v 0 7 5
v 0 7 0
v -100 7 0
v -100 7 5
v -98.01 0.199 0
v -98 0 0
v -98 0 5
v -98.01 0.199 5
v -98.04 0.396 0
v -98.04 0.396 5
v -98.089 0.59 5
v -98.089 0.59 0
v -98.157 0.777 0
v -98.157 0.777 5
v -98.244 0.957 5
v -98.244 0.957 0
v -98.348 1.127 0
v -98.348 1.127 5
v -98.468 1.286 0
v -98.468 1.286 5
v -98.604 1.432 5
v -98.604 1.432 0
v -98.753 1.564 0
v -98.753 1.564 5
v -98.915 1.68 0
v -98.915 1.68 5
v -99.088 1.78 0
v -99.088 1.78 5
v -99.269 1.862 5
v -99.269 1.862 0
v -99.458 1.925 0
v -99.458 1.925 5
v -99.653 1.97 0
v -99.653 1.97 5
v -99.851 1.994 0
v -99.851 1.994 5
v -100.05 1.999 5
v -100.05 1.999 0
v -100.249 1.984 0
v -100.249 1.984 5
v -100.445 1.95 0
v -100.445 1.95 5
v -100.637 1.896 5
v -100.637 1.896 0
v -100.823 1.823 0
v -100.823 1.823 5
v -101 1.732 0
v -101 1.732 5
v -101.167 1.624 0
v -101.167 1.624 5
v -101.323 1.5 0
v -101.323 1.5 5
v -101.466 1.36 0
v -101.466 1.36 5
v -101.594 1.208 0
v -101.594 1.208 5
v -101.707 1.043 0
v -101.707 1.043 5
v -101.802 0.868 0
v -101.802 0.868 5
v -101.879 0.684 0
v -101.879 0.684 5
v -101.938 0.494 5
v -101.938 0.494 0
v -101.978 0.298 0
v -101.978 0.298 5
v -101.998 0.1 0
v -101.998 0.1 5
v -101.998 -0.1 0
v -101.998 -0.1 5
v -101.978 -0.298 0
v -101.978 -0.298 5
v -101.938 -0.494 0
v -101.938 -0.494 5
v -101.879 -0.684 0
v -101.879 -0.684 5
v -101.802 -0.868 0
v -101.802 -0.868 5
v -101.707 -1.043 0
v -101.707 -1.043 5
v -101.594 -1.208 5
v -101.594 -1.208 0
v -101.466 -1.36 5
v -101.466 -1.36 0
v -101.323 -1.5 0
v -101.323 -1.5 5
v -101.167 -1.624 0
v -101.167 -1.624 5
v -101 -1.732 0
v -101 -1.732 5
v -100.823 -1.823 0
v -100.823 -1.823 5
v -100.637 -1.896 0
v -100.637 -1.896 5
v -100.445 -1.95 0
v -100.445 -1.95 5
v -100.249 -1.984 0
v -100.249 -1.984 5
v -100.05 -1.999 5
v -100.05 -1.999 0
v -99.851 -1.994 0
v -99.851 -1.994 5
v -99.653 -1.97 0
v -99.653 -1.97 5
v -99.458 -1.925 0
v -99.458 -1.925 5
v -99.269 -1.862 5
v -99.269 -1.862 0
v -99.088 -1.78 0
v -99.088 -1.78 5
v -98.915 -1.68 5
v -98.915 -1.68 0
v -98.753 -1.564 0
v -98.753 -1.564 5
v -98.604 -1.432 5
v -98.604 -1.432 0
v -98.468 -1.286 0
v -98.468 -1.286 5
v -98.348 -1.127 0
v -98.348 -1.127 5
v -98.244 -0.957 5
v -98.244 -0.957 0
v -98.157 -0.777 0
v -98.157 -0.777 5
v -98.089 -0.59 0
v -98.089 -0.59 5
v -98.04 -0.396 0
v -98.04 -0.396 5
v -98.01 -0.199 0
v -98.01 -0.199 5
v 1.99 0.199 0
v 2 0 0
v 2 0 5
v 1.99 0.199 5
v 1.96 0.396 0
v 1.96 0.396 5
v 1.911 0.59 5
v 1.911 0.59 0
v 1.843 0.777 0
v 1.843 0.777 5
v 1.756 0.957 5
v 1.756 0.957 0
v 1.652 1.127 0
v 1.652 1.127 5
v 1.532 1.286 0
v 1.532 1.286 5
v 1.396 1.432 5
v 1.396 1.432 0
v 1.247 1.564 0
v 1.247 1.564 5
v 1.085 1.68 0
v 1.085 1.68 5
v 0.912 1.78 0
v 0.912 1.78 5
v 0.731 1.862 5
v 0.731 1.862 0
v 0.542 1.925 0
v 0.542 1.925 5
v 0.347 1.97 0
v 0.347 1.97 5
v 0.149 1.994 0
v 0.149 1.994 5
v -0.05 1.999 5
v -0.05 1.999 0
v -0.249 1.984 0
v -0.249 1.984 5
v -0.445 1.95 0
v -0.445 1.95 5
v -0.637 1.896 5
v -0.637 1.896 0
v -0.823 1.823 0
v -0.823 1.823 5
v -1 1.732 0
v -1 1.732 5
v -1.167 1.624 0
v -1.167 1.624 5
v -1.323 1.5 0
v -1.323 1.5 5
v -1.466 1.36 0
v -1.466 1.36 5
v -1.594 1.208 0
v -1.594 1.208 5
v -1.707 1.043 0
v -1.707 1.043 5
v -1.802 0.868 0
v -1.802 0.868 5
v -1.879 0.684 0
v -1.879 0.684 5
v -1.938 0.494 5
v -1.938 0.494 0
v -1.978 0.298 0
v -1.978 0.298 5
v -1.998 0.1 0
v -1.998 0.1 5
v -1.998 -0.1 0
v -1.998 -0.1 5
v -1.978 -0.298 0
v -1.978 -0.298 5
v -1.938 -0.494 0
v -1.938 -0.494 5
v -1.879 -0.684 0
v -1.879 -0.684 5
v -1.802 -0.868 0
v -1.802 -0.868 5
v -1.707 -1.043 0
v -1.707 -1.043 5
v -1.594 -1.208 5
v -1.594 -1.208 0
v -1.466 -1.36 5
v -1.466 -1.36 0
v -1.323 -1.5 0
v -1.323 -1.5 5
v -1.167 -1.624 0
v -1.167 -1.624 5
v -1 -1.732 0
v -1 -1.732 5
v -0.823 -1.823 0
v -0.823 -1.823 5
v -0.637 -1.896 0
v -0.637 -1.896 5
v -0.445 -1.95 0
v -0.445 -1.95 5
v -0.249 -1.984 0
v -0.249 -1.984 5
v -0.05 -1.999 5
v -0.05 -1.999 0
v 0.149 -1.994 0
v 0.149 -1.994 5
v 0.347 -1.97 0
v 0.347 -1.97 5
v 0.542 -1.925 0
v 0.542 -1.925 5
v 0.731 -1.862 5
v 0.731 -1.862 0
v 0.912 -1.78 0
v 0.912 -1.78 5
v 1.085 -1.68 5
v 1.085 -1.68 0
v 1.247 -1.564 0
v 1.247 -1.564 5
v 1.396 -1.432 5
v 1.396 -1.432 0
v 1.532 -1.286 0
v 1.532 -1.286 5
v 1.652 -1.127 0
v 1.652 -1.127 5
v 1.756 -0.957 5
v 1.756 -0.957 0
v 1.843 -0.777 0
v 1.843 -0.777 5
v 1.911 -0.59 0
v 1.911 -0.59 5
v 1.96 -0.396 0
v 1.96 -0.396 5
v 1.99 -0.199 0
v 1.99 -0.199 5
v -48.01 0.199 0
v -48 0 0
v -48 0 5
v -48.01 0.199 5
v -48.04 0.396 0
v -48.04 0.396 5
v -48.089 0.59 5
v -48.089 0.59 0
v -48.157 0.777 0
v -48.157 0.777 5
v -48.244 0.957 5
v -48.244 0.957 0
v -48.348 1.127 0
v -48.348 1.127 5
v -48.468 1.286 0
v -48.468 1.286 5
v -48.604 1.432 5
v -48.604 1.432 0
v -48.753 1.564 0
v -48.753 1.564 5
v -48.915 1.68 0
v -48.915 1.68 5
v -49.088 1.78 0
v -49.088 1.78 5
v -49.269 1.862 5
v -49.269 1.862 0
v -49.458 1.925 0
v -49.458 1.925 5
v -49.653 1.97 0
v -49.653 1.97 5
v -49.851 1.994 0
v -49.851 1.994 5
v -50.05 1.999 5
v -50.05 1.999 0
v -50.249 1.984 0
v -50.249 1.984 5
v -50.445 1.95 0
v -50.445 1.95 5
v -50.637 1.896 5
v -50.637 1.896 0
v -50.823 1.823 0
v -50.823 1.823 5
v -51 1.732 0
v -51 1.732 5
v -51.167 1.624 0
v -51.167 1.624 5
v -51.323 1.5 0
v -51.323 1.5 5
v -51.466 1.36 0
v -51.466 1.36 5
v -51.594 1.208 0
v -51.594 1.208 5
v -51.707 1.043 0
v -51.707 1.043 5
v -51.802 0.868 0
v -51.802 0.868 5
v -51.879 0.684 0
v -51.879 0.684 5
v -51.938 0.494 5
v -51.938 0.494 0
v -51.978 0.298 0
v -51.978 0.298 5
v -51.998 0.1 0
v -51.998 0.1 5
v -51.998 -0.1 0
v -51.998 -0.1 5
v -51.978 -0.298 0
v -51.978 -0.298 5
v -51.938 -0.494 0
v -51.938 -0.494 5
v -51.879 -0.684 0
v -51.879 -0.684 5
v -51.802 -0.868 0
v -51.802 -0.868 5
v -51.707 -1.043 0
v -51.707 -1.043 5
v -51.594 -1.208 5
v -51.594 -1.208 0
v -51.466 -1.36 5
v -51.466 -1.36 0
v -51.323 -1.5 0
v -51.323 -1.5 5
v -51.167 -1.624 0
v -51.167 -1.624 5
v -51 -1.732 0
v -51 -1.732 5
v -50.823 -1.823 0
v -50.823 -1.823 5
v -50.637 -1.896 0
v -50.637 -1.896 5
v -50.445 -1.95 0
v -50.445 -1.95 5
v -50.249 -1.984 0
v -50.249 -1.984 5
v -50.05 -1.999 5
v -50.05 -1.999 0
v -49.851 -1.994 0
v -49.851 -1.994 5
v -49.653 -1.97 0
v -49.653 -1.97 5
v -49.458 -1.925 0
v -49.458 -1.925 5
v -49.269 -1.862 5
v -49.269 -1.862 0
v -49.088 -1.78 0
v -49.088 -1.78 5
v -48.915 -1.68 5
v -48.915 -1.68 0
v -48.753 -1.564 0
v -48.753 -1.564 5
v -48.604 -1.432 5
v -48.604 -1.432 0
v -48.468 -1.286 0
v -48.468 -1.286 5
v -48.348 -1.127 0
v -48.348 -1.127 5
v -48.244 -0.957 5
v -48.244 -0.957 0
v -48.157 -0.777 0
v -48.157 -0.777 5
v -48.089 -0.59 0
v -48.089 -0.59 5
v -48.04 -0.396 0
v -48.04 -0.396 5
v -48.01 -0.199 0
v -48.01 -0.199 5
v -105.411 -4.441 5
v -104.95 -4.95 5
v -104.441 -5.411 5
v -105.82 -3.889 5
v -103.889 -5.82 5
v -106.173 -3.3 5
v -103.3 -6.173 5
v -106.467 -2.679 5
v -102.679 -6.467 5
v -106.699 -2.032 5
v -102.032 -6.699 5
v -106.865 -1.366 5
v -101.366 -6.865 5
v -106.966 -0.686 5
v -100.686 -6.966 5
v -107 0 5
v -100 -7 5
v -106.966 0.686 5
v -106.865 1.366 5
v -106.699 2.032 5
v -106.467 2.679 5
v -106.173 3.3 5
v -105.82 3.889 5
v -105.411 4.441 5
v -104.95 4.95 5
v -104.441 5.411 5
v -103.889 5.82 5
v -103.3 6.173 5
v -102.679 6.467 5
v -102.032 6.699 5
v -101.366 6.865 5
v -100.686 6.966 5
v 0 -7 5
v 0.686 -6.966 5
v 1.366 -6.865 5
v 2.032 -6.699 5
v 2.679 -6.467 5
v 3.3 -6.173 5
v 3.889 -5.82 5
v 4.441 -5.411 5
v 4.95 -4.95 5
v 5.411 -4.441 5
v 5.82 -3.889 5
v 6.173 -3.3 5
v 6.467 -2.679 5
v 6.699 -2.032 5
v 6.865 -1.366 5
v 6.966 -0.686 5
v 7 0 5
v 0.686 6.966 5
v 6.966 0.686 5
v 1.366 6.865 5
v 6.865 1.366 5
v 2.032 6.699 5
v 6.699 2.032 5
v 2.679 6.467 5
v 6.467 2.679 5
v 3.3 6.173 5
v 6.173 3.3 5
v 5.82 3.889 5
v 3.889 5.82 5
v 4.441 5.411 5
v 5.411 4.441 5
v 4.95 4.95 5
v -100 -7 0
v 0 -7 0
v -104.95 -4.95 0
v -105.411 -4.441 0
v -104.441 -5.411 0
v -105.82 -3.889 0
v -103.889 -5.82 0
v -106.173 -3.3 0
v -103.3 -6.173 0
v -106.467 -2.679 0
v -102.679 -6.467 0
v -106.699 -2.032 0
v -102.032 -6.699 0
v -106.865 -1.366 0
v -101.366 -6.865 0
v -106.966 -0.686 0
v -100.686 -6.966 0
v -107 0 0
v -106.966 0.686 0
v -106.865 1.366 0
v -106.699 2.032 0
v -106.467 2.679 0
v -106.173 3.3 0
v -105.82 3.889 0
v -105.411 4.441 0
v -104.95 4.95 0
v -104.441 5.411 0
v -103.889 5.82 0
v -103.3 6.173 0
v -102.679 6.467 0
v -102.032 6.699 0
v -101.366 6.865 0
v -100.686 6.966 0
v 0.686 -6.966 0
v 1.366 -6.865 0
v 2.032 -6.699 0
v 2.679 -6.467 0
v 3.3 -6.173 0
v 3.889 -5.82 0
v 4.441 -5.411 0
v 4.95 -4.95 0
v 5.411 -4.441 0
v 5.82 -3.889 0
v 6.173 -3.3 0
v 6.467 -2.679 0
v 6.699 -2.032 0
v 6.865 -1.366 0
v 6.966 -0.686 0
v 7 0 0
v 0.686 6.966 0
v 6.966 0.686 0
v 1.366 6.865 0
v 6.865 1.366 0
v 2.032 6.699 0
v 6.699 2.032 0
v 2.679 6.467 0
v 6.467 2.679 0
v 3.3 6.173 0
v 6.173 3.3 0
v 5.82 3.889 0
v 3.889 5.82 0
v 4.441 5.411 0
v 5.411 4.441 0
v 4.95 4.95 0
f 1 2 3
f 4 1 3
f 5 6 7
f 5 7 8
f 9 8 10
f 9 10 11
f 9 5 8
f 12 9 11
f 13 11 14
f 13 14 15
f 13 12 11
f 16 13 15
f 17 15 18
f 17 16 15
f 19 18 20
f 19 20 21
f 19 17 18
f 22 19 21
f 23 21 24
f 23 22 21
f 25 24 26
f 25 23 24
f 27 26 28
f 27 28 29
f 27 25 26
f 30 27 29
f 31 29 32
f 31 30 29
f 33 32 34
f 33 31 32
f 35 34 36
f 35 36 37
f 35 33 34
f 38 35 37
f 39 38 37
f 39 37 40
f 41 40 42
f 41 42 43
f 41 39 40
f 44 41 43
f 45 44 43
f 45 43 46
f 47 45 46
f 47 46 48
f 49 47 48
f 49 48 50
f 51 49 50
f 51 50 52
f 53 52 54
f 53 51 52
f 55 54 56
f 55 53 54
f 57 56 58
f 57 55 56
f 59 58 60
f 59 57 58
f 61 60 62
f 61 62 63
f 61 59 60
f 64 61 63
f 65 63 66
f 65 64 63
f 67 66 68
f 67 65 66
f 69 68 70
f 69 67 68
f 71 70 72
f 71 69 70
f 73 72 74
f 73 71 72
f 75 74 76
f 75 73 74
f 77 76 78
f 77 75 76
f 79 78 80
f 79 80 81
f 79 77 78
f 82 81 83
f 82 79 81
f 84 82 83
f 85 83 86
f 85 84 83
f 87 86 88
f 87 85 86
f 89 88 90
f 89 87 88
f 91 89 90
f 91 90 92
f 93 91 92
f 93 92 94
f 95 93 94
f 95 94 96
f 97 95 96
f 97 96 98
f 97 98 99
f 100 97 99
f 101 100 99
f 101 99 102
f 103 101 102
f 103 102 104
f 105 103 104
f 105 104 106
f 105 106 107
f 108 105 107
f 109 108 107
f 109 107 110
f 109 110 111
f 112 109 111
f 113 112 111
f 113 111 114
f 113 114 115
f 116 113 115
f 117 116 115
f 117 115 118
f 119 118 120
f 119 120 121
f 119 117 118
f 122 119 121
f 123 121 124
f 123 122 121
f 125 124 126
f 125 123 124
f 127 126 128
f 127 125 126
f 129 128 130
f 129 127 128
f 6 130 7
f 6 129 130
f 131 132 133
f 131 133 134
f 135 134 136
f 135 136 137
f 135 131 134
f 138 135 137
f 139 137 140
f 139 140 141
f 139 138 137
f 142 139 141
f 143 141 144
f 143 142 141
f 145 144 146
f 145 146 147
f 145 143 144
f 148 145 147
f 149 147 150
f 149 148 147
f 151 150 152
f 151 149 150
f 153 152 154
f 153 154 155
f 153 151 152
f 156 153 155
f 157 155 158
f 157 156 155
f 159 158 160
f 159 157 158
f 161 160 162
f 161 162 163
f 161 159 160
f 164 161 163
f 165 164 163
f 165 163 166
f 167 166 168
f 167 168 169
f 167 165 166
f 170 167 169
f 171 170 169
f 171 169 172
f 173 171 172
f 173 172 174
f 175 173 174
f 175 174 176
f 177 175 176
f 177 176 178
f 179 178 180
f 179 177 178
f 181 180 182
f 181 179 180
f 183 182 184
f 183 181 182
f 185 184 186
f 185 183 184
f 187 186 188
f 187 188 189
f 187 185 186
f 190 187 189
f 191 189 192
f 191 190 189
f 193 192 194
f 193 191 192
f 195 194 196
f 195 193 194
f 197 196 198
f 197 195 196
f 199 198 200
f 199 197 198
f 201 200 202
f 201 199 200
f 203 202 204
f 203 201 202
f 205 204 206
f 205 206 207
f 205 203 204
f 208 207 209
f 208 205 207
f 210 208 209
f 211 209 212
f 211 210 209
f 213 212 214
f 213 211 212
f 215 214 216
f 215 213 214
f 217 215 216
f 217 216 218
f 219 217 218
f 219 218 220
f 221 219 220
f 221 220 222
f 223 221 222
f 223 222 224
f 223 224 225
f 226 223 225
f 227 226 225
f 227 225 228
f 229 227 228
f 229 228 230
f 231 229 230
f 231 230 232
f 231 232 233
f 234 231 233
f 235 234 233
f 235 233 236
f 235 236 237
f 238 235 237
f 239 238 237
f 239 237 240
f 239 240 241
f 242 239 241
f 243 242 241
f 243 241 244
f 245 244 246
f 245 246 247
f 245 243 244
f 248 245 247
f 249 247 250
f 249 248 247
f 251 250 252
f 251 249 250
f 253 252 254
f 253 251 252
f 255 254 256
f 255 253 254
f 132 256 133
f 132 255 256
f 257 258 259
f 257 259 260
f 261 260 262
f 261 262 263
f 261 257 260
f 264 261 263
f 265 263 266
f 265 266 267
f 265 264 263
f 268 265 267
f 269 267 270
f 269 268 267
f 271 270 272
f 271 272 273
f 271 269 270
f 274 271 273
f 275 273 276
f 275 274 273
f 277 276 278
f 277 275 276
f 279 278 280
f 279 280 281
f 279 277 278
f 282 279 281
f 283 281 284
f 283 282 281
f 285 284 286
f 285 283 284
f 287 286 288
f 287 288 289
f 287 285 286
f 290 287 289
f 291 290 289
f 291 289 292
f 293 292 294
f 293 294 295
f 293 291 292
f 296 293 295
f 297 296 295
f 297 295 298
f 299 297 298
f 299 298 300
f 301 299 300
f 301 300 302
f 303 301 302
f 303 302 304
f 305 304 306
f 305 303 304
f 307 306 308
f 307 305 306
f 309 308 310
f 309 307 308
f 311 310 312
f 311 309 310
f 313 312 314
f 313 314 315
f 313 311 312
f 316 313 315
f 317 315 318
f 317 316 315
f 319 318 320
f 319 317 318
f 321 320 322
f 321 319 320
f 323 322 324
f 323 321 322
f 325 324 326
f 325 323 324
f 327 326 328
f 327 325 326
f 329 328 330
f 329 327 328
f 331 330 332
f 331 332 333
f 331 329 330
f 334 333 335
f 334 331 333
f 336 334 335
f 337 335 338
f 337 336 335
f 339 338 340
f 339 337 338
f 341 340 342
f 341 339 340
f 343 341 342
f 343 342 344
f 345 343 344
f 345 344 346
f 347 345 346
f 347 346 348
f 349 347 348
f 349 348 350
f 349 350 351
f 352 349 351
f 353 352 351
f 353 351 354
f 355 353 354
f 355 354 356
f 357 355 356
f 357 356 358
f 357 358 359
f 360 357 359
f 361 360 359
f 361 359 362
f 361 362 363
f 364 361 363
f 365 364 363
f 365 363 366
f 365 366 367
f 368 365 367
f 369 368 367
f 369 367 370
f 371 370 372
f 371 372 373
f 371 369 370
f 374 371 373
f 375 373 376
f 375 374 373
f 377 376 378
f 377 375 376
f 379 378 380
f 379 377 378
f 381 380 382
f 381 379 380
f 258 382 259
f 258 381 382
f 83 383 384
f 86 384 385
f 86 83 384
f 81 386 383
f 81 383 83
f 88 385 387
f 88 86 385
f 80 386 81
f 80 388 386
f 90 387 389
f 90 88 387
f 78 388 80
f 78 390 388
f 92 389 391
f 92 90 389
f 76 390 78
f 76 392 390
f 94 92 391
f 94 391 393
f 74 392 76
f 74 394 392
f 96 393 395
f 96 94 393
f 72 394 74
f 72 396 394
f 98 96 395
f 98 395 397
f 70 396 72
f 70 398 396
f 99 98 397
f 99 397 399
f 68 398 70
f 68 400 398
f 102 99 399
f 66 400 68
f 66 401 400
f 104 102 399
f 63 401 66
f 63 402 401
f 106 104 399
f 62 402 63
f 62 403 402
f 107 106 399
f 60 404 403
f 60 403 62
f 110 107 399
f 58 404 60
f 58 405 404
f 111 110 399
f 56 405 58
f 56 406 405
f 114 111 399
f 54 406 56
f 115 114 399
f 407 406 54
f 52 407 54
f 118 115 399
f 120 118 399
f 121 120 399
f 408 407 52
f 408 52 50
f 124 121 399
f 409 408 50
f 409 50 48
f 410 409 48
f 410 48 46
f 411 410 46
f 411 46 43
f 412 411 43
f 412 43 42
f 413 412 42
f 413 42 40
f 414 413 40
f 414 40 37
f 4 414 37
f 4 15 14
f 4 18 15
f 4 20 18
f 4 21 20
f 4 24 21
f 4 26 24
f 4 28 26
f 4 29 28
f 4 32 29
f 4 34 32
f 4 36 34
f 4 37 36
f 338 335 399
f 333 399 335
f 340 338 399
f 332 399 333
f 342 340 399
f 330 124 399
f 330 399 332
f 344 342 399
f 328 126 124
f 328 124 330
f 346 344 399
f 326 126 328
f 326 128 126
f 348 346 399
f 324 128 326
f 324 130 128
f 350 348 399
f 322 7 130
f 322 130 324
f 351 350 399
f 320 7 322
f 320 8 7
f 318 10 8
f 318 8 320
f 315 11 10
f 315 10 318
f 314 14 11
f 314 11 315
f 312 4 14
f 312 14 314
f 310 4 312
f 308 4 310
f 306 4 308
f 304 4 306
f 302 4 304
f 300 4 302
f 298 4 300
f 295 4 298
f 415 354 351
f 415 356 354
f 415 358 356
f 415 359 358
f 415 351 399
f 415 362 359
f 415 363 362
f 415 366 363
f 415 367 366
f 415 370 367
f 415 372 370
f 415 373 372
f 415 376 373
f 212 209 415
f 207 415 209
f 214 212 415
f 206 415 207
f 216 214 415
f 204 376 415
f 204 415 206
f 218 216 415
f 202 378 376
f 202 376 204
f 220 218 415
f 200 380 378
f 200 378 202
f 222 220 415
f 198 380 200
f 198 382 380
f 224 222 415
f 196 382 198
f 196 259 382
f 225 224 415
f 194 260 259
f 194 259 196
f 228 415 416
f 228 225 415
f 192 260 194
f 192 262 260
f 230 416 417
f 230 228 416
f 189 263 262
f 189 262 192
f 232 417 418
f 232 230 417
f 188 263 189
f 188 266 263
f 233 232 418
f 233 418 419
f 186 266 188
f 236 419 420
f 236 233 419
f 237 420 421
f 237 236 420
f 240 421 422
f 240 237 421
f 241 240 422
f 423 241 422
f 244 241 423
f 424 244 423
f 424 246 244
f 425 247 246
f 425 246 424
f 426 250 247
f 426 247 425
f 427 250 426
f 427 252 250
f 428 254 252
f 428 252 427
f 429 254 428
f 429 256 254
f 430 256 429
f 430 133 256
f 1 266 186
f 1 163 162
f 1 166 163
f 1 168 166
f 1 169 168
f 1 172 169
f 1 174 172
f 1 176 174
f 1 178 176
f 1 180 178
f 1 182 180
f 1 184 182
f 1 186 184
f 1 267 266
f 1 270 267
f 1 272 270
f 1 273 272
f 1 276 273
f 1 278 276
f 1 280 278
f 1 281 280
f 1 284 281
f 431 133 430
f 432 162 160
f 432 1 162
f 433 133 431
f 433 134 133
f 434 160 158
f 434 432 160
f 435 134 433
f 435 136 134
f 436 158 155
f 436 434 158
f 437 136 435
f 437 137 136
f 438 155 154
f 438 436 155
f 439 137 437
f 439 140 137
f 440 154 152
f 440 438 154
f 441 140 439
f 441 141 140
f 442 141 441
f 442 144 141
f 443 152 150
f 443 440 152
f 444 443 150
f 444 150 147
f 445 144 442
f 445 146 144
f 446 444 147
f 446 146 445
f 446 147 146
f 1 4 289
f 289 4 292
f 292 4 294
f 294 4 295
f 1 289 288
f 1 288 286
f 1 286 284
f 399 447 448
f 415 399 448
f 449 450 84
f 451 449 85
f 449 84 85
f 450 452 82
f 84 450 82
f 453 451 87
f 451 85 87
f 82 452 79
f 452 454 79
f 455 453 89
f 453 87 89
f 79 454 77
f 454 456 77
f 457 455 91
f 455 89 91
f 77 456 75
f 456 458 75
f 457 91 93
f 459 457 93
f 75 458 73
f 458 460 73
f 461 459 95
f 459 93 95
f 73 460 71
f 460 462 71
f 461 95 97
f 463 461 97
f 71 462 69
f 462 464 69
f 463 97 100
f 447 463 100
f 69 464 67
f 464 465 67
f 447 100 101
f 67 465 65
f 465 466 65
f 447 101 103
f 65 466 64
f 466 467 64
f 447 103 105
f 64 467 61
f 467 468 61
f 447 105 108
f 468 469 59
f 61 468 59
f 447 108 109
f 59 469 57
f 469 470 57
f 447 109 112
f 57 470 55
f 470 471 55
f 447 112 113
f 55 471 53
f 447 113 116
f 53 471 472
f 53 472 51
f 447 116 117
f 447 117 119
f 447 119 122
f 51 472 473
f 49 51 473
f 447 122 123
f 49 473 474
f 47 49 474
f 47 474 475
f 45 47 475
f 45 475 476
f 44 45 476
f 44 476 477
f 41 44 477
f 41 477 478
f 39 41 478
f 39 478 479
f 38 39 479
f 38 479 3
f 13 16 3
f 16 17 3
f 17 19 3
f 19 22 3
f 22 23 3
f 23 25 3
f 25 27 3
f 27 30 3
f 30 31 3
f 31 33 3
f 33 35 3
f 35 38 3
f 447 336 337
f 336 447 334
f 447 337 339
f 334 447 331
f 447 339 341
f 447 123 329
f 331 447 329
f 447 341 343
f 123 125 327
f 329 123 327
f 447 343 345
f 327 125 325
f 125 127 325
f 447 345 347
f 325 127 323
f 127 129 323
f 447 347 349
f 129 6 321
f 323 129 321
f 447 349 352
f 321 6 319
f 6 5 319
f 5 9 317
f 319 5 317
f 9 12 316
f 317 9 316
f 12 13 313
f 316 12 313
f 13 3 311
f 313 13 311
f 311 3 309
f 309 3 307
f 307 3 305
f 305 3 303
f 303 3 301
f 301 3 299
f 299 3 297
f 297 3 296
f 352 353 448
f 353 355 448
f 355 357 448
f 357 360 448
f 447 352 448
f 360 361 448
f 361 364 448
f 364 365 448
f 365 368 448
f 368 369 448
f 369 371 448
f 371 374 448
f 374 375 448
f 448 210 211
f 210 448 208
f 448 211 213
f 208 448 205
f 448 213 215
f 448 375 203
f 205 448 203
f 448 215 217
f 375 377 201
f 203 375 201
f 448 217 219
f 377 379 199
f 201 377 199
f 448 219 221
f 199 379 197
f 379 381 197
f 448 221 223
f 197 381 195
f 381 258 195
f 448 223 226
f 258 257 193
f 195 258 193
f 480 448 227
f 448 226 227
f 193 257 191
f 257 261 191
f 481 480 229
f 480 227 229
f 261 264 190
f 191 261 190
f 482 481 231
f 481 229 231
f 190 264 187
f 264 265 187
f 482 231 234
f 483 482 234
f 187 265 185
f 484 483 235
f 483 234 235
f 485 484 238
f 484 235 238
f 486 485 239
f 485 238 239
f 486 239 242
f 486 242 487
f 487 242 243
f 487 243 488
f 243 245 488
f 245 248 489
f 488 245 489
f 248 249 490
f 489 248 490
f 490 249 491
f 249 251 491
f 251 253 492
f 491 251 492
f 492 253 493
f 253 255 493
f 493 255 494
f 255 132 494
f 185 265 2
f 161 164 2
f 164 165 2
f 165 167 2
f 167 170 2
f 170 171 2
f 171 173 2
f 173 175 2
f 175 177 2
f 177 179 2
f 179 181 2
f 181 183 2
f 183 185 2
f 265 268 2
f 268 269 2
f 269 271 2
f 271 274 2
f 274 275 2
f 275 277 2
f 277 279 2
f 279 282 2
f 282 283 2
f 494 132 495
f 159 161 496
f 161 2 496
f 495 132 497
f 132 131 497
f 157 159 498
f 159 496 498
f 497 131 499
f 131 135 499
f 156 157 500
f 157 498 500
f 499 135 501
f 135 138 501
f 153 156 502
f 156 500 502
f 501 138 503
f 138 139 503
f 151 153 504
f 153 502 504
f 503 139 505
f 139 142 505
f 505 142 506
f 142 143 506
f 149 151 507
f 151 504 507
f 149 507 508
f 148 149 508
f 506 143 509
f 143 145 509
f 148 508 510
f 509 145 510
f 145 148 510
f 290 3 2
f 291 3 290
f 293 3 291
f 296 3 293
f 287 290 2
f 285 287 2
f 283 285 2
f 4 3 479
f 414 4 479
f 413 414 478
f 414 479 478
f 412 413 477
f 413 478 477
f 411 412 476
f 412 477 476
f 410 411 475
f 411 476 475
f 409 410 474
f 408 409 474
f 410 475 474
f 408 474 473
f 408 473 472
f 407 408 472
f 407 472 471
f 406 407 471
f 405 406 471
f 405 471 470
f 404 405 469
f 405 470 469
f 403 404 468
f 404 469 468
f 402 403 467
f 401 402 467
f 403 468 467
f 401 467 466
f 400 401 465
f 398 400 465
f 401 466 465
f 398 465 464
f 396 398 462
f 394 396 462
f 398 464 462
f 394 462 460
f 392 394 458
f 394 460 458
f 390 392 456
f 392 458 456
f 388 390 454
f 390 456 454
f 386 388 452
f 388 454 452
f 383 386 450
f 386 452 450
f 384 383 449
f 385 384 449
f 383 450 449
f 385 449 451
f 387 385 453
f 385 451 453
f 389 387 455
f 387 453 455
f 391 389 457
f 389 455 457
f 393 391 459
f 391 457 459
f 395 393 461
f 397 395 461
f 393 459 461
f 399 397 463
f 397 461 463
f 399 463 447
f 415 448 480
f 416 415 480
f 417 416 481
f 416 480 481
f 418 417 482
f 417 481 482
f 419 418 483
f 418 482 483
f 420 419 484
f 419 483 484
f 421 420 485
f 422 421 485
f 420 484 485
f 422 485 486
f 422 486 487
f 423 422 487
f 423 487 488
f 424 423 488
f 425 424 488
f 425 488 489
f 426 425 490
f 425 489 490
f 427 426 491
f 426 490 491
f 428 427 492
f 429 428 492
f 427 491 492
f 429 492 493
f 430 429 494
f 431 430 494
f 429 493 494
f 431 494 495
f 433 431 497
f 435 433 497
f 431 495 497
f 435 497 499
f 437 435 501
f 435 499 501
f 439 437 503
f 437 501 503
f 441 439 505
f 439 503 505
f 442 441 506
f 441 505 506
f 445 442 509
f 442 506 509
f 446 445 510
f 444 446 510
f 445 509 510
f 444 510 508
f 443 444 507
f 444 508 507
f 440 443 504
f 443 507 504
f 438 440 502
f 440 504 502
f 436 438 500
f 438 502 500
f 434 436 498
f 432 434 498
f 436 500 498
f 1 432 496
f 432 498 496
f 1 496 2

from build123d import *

# Parameters (mm, degrees)
F0_R     = 2
F1_DEPTH = 5


with BuildPart() as f1:
    # F0 (on Top) → F1 (new body)
    with BuildSketch(Plane.XY):
        with BuildLine():
            ThreePointArc((0, -7), (7, 0), (0, 7))
            Line((0, 7), (-100, 7))
            ThreePointArc((-100, 7), (-107, 0), (-100, -7))
            Line((-100, -7), (0, -7))
        make_face()
        with Locations((-100, 0)):
            Circle(F0_R, mode=Mode.SUBTRACT)
        with Locations((-50, 0)):
            Circle(F0_R, mode=Mode.SUBTRACT)
        Circle(F0_R, mode=Mode.SUBTRACT)
    extrude(amount=F1_DEPTH)


solid = f1.part
